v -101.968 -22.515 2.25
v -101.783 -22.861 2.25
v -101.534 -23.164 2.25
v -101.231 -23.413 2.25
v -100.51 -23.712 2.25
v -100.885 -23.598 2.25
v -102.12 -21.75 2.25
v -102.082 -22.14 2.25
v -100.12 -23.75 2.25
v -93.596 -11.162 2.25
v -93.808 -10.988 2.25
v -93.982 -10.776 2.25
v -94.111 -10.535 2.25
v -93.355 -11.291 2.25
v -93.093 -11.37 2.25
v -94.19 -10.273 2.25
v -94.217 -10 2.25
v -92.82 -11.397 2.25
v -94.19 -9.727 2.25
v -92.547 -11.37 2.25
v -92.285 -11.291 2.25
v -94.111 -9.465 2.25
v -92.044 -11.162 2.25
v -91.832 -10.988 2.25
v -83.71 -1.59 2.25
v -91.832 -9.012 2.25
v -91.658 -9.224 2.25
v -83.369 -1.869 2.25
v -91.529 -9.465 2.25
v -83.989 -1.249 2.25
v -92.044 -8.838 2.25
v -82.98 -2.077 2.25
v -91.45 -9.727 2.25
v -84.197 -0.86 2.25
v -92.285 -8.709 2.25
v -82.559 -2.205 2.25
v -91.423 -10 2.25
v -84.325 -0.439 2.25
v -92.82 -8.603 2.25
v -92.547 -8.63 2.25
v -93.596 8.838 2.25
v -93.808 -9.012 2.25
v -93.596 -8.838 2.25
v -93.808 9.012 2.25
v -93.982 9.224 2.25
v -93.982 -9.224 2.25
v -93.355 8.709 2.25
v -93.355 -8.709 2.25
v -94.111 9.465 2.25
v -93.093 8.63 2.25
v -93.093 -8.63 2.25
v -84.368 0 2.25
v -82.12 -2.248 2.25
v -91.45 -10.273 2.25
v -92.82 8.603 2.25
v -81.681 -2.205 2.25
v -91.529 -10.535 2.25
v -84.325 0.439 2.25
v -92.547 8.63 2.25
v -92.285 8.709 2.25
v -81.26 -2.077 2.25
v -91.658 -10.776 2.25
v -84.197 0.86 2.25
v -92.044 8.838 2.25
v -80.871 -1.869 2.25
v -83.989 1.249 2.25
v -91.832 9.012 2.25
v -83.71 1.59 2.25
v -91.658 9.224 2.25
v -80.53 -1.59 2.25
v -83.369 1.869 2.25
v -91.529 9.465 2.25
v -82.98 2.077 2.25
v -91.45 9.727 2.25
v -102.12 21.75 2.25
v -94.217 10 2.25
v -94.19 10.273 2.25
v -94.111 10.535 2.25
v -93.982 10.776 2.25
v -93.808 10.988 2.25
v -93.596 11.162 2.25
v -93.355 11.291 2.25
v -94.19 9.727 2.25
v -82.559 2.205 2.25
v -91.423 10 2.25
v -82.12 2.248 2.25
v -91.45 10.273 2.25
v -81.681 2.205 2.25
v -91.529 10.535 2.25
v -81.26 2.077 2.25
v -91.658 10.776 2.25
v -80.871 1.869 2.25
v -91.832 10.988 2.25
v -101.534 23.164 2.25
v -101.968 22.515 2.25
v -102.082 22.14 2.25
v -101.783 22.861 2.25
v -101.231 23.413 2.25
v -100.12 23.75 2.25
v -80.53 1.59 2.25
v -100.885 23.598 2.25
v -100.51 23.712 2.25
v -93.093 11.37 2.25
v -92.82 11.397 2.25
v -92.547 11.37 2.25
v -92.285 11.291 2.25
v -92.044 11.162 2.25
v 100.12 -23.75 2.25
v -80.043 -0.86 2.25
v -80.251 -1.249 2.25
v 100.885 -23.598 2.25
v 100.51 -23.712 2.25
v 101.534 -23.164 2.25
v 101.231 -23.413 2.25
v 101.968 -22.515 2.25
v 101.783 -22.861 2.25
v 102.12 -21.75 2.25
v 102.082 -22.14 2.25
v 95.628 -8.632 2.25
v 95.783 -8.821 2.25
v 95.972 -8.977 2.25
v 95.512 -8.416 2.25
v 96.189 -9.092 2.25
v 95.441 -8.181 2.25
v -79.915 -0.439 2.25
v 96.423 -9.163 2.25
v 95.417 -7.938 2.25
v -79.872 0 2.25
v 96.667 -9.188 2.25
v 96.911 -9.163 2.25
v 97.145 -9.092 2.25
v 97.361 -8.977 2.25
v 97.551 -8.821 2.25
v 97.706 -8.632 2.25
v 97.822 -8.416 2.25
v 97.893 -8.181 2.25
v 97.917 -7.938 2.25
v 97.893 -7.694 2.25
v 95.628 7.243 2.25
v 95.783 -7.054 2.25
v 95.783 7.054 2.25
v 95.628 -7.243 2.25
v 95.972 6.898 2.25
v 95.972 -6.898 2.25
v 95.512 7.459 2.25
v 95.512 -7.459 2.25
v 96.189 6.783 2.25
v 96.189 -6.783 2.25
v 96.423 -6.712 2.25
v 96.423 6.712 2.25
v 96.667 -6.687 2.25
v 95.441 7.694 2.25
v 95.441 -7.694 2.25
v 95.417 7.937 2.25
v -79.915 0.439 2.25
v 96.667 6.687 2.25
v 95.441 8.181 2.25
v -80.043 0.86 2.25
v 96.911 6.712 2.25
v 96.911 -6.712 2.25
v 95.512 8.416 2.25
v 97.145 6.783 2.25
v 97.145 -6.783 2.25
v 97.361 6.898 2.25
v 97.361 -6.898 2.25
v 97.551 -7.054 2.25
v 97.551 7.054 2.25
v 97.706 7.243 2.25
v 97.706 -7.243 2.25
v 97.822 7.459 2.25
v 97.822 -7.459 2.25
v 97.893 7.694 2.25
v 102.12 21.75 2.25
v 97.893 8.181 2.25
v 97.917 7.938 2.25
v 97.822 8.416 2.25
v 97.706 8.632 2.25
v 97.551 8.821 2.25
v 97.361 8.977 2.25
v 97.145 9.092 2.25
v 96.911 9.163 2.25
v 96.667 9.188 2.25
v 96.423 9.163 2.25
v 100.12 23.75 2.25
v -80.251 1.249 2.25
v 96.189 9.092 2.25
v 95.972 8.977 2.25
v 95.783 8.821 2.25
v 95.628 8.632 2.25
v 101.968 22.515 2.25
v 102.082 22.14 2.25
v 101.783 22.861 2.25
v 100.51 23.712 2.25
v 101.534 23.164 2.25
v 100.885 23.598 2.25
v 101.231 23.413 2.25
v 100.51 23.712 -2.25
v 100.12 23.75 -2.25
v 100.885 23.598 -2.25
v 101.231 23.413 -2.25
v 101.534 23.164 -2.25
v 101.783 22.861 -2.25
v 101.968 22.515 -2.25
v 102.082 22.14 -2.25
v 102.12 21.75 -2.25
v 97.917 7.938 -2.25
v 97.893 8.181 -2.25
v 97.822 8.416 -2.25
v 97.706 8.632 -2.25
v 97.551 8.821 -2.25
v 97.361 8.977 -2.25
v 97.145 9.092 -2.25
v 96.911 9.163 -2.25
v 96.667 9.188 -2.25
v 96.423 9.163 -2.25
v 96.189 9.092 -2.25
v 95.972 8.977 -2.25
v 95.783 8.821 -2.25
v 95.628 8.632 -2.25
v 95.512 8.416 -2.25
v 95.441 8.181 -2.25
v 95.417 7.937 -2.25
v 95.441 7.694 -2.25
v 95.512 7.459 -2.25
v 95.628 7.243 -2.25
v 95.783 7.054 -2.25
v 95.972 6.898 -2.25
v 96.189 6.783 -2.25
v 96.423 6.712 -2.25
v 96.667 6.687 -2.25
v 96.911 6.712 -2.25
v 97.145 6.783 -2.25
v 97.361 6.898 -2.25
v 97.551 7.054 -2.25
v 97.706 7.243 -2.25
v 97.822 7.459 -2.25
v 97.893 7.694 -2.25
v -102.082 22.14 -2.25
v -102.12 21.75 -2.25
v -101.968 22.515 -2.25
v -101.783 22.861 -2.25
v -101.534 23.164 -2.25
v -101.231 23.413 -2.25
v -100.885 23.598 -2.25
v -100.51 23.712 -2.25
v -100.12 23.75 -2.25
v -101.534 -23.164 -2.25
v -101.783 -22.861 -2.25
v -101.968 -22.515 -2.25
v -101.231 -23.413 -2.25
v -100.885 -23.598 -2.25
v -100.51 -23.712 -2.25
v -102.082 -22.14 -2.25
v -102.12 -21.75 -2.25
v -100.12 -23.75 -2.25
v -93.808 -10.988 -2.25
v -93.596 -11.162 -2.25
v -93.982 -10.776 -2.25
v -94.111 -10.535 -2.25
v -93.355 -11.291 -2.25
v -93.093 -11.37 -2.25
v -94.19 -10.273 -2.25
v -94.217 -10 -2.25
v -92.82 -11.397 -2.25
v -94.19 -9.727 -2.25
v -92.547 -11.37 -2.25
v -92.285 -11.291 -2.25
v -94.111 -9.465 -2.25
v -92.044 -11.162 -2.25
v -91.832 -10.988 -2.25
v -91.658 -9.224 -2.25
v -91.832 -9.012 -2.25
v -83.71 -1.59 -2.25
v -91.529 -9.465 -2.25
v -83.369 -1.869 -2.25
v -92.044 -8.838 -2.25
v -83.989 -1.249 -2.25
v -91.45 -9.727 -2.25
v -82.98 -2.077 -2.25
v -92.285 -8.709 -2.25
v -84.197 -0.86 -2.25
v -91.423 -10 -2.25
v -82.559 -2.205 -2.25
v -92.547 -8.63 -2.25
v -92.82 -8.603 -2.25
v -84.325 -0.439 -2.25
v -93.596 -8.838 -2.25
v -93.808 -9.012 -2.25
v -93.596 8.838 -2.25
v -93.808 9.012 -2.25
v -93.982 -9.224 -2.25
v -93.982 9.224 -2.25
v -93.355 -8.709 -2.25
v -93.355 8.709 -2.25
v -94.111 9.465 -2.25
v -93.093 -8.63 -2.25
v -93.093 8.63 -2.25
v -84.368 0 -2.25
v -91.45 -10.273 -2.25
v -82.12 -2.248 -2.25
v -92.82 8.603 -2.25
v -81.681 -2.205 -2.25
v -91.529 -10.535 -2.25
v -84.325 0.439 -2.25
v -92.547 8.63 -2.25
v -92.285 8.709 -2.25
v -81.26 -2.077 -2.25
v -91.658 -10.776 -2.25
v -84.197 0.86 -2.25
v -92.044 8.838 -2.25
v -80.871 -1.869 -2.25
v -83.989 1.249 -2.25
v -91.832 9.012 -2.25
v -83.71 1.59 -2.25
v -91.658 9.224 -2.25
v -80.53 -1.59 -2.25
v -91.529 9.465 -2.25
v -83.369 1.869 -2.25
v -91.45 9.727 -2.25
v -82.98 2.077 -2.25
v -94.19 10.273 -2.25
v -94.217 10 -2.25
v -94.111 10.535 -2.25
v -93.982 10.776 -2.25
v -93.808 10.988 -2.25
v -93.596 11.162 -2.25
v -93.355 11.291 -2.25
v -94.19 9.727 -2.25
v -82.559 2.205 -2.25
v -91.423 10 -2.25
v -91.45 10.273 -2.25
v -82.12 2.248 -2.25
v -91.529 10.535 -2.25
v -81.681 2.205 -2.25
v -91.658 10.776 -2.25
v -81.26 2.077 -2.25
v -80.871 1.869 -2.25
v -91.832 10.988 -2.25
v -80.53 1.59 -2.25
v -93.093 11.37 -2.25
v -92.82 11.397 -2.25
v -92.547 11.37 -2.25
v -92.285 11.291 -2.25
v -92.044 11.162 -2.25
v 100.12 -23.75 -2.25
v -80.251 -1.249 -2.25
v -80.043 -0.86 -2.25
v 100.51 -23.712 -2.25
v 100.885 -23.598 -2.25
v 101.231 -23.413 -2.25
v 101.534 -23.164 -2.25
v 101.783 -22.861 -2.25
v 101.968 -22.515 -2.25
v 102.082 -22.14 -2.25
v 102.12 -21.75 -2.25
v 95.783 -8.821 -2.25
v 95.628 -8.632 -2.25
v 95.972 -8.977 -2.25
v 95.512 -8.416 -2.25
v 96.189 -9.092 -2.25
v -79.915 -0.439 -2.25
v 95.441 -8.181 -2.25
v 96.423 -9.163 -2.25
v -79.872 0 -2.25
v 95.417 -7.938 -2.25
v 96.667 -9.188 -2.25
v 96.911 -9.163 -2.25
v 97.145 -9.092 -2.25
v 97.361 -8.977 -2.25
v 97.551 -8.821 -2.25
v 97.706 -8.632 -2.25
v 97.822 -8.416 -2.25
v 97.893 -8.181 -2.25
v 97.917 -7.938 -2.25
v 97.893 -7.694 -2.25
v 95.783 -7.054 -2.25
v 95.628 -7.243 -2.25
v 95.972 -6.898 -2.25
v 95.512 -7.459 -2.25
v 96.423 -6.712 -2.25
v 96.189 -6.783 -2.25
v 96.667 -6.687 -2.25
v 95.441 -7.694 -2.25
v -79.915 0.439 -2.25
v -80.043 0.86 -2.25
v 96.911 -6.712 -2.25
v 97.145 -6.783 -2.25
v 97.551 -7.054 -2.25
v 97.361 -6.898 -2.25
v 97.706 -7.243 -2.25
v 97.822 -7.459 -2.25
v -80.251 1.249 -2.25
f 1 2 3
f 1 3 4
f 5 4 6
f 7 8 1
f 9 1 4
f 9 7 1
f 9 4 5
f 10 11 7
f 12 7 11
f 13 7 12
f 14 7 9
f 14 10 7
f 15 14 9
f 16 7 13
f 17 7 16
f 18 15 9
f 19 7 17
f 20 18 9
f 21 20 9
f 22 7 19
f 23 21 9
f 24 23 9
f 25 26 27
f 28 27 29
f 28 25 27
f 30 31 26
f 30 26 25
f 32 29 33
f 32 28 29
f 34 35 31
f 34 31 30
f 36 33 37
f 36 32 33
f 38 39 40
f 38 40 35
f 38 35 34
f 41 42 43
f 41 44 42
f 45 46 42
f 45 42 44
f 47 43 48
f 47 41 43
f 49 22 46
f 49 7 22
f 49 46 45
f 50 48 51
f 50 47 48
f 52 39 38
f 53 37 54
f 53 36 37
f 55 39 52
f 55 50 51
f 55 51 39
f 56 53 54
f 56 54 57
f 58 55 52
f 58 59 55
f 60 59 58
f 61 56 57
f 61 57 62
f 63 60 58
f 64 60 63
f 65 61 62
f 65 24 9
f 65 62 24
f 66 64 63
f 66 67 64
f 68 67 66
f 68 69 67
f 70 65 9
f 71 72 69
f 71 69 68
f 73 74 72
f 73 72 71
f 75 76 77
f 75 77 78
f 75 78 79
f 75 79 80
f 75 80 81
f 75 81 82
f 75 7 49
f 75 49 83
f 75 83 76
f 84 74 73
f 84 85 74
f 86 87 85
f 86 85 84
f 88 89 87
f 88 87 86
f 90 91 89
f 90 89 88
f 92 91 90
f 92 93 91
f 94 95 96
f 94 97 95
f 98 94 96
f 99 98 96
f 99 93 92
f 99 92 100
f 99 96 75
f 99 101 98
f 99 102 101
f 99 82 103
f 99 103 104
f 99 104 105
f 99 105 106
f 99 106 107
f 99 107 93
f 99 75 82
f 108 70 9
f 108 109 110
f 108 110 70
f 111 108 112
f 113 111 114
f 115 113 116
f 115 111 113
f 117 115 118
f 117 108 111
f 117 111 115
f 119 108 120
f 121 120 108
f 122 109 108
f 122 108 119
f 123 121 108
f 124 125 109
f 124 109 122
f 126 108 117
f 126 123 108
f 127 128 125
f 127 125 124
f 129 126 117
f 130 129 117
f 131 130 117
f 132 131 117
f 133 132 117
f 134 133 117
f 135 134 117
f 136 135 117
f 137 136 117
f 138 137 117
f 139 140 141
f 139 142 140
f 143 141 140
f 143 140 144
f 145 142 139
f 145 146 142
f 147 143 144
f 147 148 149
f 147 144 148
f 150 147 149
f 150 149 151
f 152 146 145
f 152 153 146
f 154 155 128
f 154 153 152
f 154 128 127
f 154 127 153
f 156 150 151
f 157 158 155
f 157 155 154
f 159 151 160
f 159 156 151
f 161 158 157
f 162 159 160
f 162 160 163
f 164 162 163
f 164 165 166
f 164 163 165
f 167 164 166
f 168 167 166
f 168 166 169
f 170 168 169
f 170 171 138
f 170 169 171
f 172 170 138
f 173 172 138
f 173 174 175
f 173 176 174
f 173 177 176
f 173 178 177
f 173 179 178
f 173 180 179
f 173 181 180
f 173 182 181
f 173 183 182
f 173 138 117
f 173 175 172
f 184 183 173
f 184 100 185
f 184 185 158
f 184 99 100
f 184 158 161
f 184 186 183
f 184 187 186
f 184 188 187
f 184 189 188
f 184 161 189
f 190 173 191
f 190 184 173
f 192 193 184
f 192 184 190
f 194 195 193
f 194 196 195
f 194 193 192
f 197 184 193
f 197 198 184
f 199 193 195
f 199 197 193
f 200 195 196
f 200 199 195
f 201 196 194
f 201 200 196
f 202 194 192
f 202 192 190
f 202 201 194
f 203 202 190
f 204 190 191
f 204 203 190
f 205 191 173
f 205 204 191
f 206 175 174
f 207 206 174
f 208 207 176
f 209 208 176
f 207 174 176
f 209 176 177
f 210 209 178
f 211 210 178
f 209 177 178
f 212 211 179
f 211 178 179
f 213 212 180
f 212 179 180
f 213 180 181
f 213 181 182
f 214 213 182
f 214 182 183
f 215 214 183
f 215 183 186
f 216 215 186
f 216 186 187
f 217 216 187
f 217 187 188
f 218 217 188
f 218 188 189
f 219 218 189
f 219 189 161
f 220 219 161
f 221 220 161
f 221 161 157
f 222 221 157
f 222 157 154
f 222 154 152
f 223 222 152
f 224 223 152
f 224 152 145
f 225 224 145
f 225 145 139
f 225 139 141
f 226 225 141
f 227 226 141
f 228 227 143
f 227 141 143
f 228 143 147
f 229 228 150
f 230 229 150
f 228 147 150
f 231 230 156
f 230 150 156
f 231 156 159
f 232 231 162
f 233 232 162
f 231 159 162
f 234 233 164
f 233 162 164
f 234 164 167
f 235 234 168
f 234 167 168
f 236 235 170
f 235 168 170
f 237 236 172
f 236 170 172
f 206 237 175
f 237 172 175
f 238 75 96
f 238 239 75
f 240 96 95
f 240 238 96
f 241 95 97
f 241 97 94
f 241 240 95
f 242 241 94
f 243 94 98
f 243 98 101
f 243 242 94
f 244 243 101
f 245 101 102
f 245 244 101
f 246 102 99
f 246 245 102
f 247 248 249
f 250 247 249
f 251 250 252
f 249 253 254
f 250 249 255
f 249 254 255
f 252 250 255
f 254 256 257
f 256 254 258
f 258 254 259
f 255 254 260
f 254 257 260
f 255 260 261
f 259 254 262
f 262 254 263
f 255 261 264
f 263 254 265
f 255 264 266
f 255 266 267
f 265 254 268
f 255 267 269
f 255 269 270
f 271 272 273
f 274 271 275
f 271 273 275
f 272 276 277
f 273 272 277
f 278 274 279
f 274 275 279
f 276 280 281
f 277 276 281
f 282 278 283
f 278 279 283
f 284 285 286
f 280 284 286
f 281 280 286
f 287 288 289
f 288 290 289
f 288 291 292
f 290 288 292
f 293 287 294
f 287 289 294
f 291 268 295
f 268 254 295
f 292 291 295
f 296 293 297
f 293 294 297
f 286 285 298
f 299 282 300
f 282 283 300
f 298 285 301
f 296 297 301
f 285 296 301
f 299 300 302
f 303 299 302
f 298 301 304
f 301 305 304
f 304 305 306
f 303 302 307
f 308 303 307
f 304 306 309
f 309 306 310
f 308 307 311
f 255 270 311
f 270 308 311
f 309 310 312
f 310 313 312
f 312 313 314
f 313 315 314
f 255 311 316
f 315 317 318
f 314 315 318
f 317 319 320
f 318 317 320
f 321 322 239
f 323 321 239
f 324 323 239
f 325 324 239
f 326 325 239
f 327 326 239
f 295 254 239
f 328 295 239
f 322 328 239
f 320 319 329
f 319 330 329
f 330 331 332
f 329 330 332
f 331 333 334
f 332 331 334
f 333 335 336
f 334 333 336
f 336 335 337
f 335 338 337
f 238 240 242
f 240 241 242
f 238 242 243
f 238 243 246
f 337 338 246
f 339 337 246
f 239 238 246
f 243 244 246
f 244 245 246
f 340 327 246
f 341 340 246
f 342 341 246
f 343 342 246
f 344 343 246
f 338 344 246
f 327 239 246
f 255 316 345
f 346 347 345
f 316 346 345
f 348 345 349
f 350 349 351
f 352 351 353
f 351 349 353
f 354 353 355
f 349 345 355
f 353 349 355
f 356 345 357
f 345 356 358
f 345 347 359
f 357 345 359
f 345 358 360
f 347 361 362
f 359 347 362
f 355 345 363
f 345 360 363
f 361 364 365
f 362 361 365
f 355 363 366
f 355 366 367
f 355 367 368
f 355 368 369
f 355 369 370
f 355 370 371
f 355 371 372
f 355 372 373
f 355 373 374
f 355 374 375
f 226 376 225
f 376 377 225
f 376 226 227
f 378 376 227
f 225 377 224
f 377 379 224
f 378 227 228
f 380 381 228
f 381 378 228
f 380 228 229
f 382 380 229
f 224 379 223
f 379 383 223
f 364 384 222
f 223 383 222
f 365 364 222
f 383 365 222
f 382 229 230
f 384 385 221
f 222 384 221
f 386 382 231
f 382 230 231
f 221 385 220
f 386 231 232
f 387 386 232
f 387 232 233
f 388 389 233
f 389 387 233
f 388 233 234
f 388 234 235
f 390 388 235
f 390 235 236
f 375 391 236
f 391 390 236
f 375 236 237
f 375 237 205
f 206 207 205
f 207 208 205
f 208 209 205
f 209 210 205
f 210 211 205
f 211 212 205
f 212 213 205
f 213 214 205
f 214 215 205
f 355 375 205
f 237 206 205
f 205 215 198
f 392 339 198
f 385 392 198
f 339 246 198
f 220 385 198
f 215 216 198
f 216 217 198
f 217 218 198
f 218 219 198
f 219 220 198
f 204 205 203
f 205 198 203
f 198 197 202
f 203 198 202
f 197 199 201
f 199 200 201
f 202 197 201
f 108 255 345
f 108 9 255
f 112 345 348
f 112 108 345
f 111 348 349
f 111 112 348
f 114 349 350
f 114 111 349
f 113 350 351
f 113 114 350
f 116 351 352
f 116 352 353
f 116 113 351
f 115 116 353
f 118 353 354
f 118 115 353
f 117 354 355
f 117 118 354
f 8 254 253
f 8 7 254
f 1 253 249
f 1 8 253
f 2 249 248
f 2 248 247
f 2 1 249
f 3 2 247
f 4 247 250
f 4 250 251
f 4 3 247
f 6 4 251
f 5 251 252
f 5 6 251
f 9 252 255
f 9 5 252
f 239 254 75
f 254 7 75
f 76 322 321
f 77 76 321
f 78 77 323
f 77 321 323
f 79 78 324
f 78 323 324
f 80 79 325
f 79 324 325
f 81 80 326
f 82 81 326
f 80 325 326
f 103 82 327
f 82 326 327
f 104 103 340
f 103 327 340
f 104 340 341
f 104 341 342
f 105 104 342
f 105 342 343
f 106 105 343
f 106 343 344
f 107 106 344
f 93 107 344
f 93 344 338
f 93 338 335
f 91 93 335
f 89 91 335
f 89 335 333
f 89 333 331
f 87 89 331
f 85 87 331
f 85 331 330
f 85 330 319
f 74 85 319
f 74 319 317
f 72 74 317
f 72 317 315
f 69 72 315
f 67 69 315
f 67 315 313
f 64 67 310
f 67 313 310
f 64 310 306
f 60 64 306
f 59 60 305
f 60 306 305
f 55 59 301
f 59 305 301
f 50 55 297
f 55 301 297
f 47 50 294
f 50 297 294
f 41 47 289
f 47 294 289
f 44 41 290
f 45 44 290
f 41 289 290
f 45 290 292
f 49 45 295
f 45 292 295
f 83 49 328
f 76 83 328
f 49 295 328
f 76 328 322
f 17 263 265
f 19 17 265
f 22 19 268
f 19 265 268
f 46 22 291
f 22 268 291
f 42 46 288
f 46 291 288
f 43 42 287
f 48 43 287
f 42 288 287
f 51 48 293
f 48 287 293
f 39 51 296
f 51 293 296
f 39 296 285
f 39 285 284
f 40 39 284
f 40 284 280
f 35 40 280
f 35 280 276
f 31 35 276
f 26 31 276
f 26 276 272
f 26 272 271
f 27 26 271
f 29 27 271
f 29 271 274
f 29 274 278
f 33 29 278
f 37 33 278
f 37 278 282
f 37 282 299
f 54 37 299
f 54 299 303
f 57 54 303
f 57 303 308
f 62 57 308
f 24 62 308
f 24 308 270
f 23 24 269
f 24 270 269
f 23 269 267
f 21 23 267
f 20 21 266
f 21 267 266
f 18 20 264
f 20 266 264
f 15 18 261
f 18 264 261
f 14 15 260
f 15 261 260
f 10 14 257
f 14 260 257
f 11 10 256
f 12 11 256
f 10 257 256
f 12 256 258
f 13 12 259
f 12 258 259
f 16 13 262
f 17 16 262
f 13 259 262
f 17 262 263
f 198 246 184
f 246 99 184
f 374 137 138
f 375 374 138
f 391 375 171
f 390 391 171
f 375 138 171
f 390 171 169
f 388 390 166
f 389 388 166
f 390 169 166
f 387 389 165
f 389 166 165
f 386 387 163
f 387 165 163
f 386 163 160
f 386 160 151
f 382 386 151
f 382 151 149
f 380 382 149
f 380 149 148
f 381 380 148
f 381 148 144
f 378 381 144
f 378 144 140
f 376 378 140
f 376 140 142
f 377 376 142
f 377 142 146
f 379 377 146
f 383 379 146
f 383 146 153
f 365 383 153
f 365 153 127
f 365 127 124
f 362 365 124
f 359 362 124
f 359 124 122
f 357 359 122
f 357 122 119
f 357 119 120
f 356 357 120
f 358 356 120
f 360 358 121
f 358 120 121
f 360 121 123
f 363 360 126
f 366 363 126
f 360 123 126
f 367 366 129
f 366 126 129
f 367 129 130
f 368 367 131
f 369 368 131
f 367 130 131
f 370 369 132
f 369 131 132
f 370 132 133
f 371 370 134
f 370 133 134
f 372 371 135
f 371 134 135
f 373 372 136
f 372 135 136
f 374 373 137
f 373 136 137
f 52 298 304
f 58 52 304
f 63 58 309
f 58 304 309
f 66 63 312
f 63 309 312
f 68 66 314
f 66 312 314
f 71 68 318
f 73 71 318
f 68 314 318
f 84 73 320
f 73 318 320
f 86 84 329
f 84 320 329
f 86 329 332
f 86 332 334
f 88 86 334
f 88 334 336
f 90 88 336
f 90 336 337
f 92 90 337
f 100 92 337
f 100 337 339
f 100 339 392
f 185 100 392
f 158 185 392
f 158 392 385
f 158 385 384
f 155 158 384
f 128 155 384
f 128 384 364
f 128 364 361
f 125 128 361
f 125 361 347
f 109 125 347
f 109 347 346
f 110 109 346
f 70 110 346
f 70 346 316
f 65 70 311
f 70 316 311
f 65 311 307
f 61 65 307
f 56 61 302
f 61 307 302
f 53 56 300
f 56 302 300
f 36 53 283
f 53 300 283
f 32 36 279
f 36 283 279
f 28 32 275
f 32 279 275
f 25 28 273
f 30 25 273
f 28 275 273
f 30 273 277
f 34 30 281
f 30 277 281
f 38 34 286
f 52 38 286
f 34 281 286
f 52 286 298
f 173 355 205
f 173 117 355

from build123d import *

# Parameters (mm, degrees)
SKETCH1_W                      = 204.24
SKETCH1_H                      = 47.5
BOSS_EXTRUDE1_DEPTH            = 2.25
F_8_CLEARANCE_HOLE1_D          = 4.4958
FILLET1_R                      = 2
F_3_CLEARANCE_HOLE1_D          = 2.794
F_2_0_221_DIAMETER_HOLE1_D     = 2.50000008
F_2_0_221_DIAMETER_HOLE1_DEPTH = 20
F_2_0_221_DIAMETER_HOLE1_TIP   = 0.751075798


with BuildPart() as part:
    # Sketch1 → Boss-Extrude1 (new, symmetric)
    with BuildSketch(Plane.XY):
        Rectangle(SKETCH1_W, SKETCH1_H)
    extrude(amount=BOSS_EXTRUDE1_DEPTH, both=True)

    # #8 Clearance Hole1 (through all)
    with Locations(Plane.XY.offset(2.25)):
        with Locations((-82.12, 0)):
            Hole(F_8_CLEARANCE_HOLE1_D / 2)

    # Fillet1
    fillet1_edges = [part.edges().sort_by_distance(p)[0] for p in [
        (-102.12, 23.75, 0),
        (102.12, 23.75, 0),
        (102.12, -23.75, 0),
        (-102.12, -23.75, 0),
    ]]
    fillet(fillet1_edges, radius=FILLET1_R)

    # #3 Clearance Hole1 (through all)
    with Locations(Plane.XY.offset(2.25)):
        with Locations((-92.82, 10), (-92.82, -10)):
            Hole(F_3_CLEARANCE_HOLE1_D / 2)

    # #2 (0.221) Diameter Hole1
    with Locations(Plane(origin=(0, 0, -2.25), x_dir=(-1, 0, 0), z_dir=(0, 0, -1))):
        with Locations((-96.666875, 7.9375), (-96.666875, -7.9375)):
            Hole(F_2_0_221_DIAMETER_HOLE1_D / 2, depth=F_2_0_221_DIAMETER_HOLE1_DEPTH)
            with Locations((0, 0, -(F_2_0_221_DIAMETER_HOLE1_DEPTH + F_2_0_221_DIAMETER_HOLE1_TIP / 2))):  # 118° drill point
                Cone(0, F_2_0_221_DIAMETER_HOLE1_D / 2, F_2_0_221_DIAMETER_HOLE1_TIP, mode=Mode.SUBTRACT)


solid = part.part
